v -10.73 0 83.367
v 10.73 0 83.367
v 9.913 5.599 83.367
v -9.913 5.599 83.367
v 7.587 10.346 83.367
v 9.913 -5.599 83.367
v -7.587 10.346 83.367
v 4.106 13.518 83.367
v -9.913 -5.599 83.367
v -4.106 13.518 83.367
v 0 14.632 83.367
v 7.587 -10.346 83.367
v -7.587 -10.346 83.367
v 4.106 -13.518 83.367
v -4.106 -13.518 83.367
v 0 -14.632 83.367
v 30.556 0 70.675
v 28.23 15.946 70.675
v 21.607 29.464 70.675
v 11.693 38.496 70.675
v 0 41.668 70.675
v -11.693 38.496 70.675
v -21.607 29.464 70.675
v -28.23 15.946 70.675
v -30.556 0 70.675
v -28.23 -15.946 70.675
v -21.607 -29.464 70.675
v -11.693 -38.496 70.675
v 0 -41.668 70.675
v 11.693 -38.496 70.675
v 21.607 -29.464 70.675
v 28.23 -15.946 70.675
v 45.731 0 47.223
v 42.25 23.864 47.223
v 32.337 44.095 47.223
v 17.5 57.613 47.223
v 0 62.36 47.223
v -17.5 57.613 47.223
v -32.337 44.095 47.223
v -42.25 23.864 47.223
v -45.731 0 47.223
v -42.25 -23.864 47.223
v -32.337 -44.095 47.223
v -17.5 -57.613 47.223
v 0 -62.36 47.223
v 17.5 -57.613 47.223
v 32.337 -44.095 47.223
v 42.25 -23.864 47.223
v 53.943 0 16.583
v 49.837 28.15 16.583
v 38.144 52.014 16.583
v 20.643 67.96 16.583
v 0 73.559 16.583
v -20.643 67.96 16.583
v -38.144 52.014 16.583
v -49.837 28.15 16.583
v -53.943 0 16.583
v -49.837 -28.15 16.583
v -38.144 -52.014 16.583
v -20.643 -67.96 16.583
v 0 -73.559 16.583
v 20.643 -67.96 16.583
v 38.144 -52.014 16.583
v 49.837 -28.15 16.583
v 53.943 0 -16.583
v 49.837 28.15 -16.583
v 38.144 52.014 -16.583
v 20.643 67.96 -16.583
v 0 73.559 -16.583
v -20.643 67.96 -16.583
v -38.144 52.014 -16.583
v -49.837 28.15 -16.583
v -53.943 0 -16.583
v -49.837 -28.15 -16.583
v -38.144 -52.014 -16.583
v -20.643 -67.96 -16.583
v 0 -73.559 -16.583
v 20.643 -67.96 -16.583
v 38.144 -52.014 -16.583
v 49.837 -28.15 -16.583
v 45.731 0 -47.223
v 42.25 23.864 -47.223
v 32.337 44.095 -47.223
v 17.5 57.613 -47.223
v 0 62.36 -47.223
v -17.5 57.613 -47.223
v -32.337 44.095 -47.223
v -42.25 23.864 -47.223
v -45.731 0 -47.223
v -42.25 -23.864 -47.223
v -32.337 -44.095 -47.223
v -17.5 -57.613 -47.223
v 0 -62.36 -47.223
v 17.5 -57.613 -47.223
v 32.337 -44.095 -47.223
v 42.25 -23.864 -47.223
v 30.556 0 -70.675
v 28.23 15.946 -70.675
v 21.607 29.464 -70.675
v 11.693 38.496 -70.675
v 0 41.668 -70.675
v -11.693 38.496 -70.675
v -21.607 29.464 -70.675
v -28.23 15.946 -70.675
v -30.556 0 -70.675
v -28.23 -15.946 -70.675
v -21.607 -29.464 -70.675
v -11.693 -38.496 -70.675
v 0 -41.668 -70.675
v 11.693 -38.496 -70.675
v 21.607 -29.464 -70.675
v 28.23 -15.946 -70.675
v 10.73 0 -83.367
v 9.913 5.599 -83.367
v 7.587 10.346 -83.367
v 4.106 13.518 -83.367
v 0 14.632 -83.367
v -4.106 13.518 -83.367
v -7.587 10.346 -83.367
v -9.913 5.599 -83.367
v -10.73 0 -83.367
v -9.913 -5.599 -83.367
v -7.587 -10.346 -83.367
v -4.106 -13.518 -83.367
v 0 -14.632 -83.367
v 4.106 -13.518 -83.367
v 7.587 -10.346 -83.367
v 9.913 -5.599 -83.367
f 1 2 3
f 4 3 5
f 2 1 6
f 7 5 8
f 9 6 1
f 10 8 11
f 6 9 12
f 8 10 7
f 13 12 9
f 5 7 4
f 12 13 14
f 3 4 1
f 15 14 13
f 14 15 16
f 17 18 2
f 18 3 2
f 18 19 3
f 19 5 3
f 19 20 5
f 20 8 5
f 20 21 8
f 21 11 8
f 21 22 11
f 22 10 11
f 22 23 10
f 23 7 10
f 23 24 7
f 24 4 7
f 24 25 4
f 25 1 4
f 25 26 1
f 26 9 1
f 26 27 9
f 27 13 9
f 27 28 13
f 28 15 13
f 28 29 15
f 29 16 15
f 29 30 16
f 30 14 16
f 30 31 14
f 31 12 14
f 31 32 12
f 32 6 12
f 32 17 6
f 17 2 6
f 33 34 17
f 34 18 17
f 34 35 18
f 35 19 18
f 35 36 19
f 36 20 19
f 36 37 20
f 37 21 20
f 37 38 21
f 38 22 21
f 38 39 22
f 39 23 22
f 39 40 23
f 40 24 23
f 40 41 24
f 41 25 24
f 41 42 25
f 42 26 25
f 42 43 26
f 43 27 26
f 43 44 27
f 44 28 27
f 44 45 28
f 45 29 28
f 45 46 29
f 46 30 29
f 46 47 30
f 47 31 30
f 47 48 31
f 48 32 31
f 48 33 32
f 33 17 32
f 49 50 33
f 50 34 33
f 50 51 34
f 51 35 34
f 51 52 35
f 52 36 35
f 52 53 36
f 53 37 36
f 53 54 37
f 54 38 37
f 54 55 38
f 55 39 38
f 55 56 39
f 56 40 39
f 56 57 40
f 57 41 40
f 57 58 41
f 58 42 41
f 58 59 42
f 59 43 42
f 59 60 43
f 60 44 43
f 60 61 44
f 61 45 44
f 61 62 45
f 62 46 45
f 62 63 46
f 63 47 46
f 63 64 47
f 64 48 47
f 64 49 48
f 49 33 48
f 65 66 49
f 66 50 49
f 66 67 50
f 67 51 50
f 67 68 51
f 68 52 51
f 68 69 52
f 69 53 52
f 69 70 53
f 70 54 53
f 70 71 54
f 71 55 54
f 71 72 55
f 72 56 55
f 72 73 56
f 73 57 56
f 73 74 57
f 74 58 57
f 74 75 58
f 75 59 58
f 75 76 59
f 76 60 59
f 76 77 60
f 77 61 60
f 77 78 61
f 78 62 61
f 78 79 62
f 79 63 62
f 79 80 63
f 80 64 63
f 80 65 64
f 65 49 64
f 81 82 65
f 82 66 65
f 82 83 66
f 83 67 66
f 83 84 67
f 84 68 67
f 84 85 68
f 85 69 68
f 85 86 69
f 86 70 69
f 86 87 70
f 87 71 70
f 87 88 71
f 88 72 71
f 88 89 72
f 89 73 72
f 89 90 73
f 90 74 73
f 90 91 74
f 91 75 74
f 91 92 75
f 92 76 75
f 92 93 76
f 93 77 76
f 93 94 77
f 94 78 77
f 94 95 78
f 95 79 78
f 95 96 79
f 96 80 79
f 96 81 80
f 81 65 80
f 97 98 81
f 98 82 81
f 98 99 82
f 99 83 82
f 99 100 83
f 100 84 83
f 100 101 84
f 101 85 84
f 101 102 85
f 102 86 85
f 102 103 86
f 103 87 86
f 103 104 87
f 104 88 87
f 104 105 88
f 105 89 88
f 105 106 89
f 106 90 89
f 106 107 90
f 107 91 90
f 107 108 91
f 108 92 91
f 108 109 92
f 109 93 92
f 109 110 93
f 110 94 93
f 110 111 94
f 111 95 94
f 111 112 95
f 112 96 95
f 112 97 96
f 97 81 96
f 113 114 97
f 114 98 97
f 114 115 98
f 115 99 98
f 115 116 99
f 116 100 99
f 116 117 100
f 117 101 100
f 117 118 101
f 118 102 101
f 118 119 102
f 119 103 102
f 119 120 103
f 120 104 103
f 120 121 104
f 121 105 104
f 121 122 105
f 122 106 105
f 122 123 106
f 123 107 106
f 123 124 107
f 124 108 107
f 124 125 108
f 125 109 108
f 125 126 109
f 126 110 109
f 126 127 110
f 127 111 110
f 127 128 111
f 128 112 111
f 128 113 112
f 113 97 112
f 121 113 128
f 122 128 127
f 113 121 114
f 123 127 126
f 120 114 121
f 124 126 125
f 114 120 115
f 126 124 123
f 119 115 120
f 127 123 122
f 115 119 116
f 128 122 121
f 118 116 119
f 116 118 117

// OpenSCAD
// Generated by SolidPython 1.0.1 on 2020-07-29 00:46:50


scale(v = [11, 15, 17]) {
	sphere(r = 5);
}
/***********************************************
*********      SolidPython code:      **********
************************************************
 
# import packages: SolidPython
from solid import *
from solid.utils import *
from itertools import chain, combinations, permutations


class Resize:

    def __init__(self, scad_file):
        self.scad_file = scad_file
        #self.scad_file = import_scad(scad_file)
        # cone/cylinder param:
        self.r1 = 0
        self.r2 = 0
        self.h = 0
        # rectangular prism param:
        self.w = 0
        self.l = 0
        # ellipse param:
        self.r = 0

    # import OpenScad code (file name corresponds to shape)


    # classify shape + parameters
    def assign(self, param1, param2, param3):
        if self.scad_file == 'cone.scad':
            self.r1 = param1
            self.r2 = param2
            self.h = param3
        elif self.scad_file == 'cylinder.scad':
            self.r1 = param1
            self.r2 = param2
            self.h = param3
        elif self.scad_file == 'rectangularPrism.scad':
            self.h = param1
            self.l = param2
            self.w = param3
        else:
            self.r = param1
            self.h = param2

    # resize parameters
    def iterate(self):
        x = range(3, 20, 2)
        i = 1
        if self.scad_file == 'cone.scad':
            tempList = list(permutations(x, 2))
            for temp in tempList:
                param1 = temp[0]
                param2 = temp[1]
                filepath = 'produced_scad_files/' + 'cone' + str(param1) + '_' + str(param2) + '_' + '.scad'
                scad_render_to_file(cylinder(h=param1, r1=param2, r2=0), filepath)

        elif self.scad_file == 'cylinder.scad':
            tempList = list(permutations(x, 3))
            for temp in tempList:
                param1 = temp[0]
                param2 = temp[1]
                filepath = 'produced_scad_files/' + 'cylinder' + str(param1) + '_' + str(param2) + '_' + '.scad'
                scad_render_to_file(cylinder(h=param1, r1=param2, r2=param2), filepath)

        elif self.scad_file == 'rectangularPrism.scad':
            tempList = list(permutations(x, 3))
            for temp in tempList:
                param1 = temp[0]
                param2 = temp[1]
                param3 = temp[2]
                filepath = 'produced_scad_files/' + 'rectangularPrism' + str(param1) + '_' + str(param2) + '_' + str(
                    param3) + '.scad'
                scad_render_to_file(cube(size=(param1, param2, param3)), filepath)

        elif self.scad_file == 'ellipse.scad':
            tempList = list(permutations(x, 4))
            for temp in tempList:
                param1 = temp[0]
                param2 = temp[1]
                param3 = temp[2]
                param4 = temp[3]
                filepath = 'produced_scad_files/' + 'ellipse' + str(param1) + '_' + str(param2) + '_' + str(param3) + '_' + str(param4) + '.scad'
                scad_render_to_file(scale([param1, param2, param3])(sphere(r=param4)), filepath)

    def render_to_scadfile(self):
        scad_render_to_file(scad, 'example.scad') 
 
************************************************/
